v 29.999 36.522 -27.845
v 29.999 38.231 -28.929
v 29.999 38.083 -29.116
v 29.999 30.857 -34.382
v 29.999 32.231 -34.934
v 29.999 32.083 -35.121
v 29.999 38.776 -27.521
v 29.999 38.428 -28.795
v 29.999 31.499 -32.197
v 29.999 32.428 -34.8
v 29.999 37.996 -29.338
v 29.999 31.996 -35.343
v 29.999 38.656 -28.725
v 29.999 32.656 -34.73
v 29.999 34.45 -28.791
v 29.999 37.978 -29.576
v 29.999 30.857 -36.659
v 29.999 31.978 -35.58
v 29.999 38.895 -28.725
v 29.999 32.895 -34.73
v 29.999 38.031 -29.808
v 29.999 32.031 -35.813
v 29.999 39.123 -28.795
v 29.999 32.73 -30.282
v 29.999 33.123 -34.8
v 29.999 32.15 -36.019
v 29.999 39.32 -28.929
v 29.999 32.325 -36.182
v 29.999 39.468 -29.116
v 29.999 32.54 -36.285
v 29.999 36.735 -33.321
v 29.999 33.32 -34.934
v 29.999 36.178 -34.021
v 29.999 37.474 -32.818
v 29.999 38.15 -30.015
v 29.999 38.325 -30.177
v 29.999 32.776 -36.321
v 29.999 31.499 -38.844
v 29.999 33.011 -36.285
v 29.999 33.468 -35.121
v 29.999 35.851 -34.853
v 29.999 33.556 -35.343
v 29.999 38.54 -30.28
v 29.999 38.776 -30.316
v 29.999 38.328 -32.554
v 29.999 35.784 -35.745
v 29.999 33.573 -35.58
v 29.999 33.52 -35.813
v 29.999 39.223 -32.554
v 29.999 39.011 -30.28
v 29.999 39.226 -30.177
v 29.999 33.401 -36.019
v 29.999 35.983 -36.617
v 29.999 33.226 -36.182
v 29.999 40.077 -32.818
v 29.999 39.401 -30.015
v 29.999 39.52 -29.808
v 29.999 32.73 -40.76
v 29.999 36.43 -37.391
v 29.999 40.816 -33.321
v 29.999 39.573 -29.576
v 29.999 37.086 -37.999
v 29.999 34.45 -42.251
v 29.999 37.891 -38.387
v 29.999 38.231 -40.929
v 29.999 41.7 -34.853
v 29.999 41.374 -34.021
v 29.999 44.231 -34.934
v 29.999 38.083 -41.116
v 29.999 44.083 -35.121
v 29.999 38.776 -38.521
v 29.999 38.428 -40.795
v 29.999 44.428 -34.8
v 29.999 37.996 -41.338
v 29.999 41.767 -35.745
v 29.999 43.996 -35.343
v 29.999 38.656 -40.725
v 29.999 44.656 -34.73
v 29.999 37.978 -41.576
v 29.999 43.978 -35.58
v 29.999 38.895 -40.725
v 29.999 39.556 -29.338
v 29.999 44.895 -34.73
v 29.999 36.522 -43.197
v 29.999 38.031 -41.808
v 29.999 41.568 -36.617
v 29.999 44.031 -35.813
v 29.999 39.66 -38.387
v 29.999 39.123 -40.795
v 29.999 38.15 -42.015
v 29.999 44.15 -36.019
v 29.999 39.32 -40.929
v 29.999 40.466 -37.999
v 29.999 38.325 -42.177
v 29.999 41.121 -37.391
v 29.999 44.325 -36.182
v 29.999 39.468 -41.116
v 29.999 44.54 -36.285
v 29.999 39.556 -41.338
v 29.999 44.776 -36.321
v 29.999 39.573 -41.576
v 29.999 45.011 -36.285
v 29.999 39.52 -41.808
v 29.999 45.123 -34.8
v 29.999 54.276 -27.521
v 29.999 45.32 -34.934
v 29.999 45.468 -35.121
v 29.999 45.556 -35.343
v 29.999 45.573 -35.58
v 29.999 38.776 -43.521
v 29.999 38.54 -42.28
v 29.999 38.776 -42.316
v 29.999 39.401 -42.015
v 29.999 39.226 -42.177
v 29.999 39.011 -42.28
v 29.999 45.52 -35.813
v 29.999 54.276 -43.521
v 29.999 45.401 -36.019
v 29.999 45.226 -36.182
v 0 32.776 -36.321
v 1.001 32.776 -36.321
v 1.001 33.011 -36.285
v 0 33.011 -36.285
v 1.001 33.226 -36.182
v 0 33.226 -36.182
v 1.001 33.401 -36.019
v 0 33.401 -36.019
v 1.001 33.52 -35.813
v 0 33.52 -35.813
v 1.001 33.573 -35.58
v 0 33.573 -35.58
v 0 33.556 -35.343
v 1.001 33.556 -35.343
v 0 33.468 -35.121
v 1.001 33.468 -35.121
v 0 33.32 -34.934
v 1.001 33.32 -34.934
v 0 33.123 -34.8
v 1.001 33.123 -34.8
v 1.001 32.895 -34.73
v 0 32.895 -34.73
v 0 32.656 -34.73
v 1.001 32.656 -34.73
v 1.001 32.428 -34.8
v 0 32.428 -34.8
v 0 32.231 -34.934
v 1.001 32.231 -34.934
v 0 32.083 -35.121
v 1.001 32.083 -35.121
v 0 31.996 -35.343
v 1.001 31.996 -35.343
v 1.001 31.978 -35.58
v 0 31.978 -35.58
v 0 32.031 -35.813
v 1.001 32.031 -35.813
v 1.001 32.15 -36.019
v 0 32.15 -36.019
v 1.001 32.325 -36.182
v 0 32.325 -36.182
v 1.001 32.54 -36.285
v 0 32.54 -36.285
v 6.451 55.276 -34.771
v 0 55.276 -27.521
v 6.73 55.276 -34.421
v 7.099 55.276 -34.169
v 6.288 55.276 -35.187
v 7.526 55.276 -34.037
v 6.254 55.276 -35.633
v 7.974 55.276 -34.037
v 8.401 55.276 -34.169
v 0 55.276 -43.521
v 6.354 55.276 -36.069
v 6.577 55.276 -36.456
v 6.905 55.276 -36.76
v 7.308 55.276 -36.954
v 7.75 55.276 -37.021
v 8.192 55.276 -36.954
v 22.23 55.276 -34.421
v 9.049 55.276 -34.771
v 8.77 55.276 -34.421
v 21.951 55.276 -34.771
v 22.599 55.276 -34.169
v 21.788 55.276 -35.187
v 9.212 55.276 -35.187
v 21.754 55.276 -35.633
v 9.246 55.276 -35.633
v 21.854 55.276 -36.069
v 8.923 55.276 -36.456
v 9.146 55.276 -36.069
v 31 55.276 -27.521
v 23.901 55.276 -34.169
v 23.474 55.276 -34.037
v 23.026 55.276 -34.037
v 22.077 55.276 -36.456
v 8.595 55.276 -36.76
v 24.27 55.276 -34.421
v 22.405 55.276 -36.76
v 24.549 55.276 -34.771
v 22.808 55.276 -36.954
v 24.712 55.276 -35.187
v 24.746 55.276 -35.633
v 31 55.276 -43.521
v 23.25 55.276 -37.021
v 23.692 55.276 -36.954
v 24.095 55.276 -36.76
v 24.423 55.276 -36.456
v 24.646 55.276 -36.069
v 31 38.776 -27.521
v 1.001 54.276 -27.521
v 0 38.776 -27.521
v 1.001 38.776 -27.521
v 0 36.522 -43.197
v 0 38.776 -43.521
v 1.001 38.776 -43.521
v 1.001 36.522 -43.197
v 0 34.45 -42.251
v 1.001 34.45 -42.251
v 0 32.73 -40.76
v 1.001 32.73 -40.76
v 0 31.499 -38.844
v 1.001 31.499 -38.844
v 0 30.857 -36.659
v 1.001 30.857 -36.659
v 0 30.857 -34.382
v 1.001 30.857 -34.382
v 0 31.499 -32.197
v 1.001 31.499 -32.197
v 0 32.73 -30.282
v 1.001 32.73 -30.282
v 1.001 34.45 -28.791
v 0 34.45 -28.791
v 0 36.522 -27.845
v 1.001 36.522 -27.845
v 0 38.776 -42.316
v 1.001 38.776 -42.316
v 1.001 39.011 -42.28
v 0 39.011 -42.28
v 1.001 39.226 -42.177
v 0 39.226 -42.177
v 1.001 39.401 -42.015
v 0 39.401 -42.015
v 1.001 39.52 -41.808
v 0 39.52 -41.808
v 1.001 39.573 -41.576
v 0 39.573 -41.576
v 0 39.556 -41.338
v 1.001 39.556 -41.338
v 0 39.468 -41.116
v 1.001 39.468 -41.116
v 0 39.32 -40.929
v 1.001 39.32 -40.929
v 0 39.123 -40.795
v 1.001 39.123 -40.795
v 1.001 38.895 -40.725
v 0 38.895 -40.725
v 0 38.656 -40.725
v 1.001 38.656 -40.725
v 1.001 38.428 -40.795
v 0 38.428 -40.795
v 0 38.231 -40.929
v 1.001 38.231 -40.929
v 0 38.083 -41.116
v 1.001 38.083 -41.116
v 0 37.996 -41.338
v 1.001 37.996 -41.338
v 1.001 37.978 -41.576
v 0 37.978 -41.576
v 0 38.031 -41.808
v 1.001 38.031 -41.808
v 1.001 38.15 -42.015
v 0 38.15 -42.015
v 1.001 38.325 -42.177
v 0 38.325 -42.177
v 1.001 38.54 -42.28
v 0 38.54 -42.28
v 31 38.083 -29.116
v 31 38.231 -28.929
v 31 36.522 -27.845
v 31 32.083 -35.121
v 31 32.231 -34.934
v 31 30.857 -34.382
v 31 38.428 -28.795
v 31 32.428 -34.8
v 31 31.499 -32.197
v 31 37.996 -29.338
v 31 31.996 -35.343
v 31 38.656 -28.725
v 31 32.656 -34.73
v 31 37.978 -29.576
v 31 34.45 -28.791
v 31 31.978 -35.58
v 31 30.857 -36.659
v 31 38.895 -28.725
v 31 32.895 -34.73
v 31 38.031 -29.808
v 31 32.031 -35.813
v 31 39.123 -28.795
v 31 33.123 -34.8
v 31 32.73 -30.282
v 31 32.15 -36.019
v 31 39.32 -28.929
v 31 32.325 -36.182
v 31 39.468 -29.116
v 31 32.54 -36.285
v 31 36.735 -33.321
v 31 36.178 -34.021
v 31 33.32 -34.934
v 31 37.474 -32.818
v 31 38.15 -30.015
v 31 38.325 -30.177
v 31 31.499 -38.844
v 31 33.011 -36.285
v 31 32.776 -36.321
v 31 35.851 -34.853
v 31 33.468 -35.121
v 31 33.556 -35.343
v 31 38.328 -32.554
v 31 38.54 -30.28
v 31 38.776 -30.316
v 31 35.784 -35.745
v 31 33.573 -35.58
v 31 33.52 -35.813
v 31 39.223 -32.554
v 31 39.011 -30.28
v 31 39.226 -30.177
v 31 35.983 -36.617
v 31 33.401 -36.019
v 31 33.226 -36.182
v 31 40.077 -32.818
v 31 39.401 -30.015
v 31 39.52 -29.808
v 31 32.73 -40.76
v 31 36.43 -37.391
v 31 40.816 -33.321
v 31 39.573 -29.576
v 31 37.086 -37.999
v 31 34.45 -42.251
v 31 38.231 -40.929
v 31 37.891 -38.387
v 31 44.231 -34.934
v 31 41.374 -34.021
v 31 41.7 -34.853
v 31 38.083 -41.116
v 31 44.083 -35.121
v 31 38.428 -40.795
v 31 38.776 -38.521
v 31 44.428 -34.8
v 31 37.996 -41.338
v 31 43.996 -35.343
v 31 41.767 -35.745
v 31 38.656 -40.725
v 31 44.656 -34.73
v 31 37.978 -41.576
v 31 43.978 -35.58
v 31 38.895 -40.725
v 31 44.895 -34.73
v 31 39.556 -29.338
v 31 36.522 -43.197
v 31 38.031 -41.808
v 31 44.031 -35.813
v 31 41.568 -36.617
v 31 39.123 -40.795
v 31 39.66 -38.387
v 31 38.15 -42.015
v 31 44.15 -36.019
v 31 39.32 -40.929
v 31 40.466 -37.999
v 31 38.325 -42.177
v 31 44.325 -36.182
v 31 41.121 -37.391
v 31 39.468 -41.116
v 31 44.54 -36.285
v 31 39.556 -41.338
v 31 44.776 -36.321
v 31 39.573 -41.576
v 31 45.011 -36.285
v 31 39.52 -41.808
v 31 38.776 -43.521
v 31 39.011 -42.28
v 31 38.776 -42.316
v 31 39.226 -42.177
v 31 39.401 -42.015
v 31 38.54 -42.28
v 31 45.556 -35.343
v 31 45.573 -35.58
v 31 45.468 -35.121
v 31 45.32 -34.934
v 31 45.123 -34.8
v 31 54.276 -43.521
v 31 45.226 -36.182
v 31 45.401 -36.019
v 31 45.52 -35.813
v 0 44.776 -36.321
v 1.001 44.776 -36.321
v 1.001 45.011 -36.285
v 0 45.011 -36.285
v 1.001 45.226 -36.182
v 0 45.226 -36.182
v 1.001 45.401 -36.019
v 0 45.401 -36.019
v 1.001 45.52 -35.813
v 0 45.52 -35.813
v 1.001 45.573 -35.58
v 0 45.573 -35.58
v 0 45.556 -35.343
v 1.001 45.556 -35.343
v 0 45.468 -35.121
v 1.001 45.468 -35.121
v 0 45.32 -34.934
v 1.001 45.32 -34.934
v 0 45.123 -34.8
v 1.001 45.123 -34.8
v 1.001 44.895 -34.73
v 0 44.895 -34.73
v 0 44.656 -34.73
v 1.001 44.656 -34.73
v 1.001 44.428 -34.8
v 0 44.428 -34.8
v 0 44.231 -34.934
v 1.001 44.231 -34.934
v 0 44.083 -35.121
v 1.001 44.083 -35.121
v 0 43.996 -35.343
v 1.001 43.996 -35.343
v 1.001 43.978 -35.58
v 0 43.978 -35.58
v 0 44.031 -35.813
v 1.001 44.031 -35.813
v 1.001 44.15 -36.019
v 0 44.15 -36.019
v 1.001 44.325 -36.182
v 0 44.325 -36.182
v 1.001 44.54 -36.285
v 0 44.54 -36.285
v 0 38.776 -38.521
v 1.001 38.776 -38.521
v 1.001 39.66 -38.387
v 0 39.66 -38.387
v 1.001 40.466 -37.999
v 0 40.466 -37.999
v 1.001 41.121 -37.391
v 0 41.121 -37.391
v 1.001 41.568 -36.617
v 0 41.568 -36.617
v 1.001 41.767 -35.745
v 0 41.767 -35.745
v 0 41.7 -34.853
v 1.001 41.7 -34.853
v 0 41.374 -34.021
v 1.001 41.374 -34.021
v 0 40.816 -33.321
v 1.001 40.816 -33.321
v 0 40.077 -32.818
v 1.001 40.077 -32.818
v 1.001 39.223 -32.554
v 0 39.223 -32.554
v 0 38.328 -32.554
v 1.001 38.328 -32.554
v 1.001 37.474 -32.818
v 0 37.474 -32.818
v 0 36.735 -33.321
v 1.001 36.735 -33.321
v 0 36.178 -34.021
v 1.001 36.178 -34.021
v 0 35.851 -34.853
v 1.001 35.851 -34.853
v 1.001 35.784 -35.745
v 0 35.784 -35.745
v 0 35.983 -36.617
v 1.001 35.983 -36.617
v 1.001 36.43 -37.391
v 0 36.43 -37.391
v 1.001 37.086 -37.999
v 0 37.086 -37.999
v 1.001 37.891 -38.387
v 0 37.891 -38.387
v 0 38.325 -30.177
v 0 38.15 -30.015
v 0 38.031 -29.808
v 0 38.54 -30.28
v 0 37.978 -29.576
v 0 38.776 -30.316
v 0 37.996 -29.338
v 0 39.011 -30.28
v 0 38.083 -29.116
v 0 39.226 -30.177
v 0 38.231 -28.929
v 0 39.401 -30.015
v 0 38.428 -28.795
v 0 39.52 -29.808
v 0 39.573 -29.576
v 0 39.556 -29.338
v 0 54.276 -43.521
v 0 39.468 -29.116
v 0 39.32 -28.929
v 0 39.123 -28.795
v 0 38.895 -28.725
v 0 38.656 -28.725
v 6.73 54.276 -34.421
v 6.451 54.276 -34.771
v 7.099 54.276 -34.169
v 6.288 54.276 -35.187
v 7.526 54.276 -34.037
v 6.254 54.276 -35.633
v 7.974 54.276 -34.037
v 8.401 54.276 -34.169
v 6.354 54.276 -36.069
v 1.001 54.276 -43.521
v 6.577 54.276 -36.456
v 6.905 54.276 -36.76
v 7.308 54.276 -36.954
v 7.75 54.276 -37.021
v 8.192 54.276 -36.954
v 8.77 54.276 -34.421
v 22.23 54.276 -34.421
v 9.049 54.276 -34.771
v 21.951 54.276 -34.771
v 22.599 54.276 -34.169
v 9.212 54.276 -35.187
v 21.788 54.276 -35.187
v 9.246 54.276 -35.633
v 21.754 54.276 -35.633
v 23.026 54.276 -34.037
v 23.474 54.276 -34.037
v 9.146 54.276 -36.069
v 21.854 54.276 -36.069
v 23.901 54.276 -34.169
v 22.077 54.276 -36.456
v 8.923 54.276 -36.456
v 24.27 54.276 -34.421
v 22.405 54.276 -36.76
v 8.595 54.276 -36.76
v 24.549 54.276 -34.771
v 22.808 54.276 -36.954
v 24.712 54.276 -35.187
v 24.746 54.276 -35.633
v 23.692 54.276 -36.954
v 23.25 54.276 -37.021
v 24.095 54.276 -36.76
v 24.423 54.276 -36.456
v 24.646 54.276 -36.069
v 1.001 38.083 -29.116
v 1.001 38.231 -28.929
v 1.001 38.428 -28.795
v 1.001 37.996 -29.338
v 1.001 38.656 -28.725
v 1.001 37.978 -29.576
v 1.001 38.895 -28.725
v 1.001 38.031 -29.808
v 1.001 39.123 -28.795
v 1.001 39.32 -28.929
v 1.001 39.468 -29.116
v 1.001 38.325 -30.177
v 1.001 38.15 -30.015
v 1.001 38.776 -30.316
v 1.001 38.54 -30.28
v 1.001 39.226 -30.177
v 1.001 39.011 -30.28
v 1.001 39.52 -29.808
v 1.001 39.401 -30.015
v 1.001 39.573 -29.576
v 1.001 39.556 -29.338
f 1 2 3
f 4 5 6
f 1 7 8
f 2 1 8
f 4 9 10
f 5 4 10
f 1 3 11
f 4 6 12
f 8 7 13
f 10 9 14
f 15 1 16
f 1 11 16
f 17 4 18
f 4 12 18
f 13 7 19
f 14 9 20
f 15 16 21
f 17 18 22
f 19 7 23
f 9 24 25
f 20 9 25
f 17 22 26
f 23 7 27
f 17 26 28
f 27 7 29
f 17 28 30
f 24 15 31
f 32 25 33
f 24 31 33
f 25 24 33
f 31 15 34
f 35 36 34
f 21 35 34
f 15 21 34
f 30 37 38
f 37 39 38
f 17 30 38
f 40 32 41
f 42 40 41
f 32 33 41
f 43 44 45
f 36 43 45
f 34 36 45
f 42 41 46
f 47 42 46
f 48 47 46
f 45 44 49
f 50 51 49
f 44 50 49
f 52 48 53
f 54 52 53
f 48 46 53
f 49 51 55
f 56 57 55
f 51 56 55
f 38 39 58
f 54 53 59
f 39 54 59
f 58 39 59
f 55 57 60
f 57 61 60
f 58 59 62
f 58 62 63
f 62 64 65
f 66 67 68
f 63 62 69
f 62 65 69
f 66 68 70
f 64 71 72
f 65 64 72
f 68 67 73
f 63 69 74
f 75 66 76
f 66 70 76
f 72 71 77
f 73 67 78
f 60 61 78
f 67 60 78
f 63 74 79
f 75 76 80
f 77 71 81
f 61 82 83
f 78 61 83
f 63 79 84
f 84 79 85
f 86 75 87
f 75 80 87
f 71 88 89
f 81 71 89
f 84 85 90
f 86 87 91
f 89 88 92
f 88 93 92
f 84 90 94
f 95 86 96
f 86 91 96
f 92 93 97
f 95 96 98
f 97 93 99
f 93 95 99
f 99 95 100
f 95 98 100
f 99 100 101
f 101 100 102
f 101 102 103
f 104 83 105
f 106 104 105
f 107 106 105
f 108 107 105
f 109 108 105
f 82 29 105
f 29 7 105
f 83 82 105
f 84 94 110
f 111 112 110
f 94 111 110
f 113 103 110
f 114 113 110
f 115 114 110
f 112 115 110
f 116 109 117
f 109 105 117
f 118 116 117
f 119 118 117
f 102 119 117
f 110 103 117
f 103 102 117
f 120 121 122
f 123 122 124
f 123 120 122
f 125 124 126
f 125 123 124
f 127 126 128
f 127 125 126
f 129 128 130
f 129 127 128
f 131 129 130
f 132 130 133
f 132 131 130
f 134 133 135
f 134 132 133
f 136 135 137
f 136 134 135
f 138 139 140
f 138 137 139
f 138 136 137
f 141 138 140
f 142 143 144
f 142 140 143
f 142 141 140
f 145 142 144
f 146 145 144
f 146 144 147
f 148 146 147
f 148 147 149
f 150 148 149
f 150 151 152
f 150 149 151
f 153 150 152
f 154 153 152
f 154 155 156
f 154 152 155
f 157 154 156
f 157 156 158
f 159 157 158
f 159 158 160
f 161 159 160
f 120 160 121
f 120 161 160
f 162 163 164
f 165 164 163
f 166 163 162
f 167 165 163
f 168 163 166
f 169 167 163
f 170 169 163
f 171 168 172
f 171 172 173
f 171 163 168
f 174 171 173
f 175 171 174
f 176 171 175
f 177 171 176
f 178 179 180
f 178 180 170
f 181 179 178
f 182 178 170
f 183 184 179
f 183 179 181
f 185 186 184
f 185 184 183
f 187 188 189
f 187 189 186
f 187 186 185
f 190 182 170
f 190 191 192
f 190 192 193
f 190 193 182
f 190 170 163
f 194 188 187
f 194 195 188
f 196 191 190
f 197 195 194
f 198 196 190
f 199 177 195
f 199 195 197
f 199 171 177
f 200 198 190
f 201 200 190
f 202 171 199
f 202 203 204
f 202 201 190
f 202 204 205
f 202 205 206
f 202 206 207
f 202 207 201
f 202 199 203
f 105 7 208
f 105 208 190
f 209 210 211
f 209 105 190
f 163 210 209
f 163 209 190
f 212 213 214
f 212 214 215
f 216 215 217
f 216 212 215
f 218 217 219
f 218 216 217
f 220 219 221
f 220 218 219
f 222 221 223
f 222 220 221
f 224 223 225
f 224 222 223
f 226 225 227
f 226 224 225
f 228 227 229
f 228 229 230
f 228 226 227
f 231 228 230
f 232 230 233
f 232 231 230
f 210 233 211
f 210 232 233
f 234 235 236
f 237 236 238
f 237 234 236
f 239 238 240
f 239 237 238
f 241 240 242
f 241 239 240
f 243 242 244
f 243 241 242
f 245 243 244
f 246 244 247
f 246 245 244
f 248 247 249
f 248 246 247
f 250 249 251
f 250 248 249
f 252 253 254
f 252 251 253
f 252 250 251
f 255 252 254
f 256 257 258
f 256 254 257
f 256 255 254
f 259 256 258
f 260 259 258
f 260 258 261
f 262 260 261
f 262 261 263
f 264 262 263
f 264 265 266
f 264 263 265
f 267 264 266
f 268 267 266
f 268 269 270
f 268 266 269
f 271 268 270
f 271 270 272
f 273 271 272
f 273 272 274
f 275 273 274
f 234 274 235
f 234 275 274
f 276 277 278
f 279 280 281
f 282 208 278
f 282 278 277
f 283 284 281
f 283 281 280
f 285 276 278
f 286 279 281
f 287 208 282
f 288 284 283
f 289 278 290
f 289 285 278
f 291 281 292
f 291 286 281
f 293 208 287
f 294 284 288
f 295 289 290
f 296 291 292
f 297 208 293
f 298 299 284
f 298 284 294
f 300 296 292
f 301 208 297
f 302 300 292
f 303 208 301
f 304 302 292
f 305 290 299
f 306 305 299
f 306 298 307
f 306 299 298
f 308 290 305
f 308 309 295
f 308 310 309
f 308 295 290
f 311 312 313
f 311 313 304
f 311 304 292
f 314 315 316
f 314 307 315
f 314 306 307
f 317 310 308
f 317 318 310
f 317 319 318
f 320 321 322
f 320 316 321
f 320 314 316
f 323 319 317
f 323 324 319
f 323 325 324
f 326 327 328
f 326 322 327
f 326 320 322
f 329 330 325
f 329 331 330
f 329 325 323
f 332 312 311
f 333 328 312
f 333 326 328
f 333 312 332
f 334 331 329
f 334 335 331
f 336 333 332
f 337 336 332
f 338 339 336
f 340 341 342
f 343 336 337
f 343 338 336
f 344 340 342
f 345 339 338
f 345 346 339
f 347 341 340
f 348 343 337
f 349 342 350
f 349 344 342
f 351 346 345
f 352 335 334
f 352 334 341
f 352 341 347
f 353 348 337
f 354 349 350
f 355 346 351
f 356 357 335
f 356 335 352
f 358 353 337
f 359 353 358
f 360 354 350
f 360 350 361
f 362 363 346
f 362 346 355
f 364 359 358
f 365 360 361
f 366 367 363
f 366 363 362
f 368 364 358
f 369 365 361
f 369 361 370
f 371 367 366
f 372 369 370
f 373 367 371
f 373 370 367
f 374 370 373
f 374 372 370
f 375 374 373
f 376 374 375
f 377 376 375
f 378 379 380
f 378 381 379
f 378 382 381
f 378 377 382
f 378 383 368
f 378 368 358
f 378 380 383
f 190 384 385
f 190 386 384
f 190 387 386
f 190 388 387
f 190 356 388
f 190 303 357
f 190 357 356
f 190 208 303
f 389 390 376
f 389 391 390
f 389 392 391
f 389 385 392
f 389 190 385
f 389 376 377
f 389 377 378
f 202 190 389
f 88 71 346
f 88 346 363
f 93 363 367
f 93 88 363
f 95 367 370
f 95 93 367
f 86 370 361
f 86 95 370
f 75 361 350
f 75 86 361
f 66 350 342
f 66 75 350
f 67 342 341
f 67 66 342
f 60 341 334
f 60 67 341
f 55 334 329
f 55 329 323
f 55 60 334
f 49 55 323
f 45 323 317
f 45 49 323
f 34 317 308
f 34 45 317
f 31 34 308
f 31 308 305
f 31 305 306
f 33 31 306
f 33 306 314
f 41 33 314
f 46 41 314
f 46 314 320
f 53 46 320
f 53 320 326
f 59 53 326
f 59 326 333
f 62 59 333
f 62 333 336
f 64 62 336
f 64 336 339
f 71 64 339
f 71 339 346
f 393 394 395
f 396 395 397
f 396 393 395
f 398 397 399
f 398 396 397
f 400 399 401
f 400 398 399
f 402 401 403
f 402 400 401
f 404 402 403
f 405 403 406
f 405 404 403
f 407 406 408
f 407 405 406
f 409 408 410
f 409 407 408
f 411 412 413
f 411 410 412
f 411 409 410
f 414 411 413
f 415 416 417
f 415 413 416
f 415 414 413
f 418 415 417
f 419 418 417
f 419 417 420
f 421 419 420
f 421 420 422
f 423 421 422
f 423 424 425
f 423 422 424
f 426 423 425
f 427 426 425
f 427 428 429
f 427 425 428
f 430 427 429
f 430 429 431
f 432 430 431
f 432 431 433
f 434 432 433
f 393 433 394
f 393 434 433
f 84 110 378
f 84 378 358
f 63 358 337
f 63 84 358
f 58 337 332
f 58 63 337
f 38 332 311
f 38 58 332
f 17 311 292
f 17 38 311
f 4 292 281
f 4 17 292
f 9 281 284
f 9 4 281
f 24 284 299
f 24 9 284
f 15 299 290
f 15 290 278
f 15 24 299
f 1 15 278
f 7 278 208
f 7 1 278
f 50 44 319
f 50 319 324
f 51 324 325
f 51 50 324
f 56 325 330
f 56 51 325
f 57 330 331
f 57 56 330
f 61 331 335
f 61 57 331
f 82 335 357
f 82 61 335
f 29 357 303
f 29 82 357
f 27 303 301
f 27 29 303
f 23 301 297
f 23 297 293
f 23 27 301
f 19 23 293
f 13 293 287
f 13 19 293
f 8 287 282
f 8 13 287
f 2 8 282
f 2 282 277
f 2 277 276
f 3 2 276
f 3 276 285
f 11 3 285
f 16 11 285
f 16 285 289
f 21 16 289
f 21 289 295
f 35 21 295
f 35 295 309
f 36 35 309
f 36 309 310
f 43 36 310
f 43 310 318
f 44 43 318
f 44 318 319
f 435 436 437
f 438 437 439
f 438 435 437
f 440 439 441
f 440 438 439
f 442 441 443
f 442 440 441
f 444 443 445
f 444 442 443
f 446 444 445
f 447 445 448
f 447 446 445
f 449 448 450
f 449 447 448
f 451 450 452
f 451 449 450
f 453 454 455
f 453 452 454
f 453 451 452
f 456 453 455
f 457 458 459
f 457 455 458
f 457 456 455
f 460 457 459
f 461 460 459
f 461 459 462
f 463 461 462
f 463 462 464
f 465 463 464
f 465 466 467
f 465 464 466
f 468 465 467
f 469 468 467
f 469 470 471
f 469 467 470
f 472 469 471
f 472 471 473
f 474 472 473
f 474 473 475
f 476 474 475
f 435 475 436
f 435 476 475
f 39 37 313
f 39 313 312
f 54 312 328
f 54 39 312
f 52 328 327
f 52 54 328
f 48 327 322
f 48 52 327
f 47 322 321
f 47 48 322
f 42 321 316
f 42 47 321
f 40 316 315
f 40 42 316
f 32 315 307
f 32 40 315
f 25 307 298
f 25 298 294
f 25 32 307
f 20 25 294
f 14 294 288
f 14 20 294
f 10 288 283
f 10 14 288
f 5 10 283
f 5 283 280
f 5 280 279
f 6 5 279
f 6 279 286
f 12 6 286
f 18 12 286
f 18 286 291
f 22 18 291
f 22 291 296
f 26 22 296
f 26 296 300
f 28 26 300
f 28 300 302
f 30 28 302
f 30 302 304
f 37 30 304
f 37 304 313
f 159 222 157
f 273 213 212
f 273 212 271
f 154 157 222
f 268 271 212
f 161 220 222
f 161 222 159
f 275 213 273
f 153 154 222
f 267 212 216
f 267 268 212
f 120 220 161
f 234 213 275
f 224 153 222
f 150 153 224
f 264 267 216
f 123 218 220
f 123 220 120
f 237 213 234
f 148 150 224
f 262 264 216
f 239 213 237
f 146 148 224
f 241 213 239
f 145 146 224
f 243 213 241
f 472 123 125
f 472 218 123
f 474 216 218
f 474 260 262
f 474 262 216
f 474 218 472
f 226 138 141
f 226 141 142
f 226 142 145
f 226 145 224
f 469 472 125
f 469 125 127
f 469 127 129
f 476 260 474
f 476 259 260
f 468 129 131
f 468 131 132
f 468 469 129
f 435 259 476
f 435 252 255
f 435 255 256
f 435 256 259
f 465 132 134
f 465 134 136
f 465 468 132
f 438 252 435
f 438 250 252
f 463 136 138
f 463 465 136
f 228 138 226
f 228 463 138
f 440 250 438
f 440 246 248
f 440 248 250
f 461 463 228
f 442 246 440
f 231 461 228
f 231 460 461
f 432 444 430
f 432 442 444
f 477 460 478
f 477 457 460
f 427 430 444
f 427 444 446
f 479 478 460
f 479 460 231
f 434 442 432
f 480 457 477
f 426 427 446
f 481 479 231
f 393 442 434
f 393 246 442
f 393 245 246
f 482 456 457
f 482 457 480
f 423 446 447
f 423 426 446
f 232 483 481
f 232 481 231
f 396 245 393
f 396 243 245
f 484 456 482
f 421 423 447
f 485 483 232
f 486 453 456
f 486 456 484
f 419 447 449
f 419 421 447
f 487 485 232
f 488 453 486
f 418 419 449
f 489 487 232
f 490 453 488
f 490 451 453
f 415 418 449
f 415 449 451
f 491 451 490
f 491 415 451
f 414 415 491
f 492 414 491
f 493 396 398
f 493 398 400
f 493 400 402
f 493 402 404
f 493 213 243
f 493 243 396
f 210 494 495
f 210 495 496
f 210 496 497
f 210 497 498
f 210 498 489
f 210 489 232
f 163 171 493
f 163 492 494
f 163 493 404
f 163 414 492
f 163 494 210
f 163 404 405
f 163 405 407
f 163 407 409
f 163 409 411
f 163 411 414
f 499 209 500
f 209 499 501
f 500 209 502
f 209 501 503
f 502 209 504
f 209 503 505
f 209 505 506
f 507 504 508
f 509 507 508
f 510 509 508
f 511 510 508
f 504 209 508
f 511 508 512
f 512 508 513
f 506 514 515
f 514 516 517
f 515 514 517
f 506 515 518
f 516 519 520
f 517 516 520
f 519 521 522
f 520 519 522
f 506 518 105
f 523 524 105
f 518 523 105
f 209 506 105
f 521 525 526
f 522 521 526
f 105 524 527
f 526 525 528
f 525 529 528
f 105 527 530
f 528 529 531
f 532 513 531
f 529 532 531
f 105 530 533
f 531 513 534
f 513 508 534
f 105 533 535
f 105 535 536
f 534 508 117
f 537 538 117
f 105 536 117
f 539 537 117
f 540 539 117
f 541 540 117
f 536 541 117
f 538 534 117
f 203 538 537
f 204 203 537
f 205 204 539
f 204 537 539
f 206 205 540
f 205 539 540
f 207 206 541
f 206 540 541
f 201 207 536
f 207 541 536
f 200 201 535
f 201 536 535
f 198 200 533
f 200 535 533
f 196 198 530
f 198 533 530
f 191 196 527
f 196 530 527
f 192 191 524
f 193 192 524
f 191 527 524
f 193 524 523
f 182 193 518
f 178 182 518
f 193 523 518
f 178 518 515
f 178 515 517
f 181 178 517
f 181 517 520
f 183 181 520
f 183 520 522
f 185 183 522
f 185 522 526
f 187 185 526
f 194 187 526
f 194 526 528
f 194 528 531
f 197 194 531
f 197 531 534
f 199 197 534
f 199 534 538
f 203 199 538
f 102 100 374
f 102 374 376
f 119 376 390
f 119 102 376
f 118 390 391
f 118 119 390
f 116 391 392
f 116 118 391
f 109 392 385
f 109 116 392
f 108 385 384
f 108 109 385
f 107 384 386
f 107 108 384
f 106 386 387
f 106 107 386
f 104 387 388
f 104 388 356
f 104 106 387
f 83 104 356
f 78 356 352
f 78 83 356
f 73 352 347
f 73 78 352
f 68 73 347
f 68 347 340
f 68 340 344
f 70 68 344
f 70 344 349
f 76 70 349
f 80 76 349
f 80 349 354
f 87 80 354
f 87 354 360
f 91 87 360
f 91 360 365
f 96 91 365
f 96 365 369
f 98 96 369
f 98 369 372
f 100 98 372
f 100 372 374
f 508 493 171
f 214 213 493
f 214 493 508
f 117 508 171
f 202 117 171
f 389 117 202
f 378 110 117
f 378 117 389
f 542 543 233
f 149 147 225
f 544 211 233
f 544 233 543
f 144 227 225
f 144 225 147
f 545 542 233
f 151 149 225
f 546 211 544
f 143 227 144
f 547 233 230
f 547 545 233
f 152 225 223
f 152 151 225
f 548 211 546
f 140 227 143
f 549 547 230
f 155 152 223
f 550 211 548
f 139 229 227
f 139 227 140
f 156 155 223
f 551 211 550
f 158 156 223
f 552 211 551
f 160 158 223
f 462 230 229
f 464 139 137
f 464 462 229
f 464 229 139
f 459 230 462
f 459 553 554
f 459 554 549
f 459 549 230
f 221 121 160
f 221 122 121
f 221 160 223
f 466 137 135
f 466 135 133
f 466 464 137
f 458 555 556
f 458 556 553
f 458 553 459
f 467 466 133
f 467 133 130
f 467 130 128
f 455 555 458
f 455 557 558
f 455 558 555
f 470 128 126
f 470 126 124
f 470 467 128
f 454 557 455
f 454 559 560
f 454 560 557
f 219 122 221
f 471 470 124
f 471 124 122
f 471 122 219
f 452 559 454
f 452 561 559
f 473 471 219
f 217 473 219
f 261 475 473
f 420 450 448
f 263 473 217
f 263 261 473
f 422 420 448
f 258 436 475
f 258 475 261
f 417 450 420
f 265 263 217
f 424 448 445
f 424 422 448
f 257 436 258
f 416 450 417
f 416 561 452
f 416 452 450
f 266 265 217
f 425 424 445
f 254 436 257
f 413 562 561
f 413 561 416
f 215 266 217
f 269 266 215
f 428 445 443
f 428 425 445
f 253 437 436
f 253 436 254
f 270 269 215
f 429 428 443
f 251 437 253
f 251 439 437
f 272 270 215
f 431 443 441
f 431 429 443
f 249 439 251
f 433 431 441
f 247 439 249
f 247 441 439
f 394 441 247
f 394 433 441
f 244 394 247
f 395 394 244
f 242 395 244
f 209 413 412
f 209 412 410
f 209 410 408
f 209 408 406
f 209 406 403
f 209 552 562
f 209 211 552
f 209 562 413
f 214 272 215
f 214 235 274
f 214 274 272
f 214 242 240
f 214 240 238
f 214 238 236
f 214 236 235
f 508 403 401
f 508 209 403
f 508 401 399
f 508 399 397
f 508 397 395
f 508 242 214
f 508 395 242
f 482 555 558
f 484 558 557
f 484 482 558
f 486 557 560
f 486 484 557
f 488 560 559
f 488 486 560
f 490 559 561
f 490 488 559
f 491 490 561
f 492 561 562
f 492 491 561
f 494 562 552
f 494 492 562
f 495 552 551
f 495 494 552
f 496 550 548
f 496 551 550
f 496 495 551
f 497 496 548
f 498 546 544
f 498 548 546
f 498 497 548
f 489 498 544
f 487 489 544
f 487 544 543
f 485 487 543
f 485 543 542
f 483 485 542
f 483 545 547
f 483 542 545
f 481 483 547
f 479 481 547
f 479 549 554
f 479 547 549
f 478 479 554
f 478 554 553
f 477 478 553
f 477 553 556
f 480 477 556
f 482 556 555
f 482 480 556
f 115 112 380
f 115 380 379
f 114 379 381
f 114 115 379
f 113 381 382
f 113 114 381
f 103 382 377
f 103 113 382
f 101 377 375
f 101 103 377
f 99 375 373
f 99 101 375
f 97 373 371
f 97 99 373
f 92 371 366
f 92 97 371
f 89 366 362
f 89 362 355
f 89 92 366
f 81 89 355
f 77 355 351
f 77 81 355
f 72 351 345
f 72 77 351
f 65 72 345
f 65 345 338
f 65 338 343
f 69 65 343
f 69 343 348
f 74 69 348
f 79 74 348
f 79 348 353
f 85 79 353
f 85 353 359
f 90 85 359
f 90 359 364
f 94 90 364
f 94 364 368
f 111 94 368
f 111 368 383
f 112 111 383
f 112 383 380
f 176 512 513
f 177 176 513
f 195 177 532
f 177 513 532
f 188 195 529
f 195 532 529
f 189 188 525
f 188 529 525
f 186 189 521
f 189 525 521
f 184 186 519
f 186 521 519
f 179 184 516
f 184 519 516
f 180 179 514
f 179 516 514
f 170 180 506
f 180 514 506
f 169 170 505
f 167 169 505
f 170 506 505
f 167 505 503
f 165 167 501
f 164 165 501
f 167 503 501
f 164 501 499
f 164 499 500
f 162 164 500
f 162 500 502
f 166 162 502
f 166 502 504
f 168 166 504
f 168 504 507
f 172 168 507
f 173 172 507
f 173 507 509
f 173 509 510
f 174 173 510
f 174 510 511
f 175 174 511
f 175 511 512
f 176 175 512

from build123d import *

# Parameters (mm, degrees)
SKETCH1_R           = 0.8
SKETCH1_R_2         = 3
BOSS_EXTRUDE1_DEPTH = 31
BOSS_EXTRUDE2_DEPTH = 1
SKETCH5_R           = 0.8
CUT_EXTRUDE3_DEPTH  = 1
SKETCH5_3_R         = 3
CUT_EXTRUDE4_DEPTH  = 1
CUT_EXTRUDE6_START  = -1
SKETCH6_W           = 28.997664588
SKETCH6_H           = 18.792631537
CUT_EXTRUDE6_DEPTH  = 104.494601352
SKETCH7_W           = 31
SKETCH7_H           = 56.017020421
CUT_EXTRUDE7_DEPTH  = 105.264671446
SKETCH8_R           = 1.5
CUT_EXTRUDE8_DEPTH  = 59.37205382


with BuildPart() as part:
    # Sketch1 → Boss-Extrude1 (new body)
    with BuildSketch(Plane(origin=(0, 0, 0), x_dir=(0, 0, -1), z_dir=(1, 0, 0))):
        with BuildLine():
            Line((27.520646447, 38.775594), (27.520646447, 55.275594))
            Line((27.520646447, 55.275594), (43.520646447, 55.275594))
            Line((43.520646447, 55.275594), (43.520646447, 38.775594))
            ThreePointArc((43.520646447, 38.775594), (35.520646447, 30.775594), (27.520646447, 38.775594))
        make_face()
        with Locations((35.520646447, 44.775594)):
            Circle(SKETCH1_R, mode=Mode.SUBTRACT)
        with Locations((41.515881392, 38.775594)):
            Circle(SKETCH1_R, mode=Mode.SUBTRACT)
        with Locations((35.520646447, 32.775594)):
            Circle(SKETCH1_R, mode=Mode.SUBTRACT)
        with Locations((29.515881392, 38.775594)):
            Circle(SKETCH1_R, mode=Mode.SUBTRACT)
        with Locations((35.520646447, 38.775594)):
            Circle(SKETCH1_R_2, mode=Mode.SUBTRACT)
    extrude(amount=BOSS_EXTRUDE1_DEPTH)

    # Sketch4 → Boss-Extrude2 (add)
    with BuildSketch(Plane(origin=(0, 55.275594, 0), x_dir=(1, 0, 0), z_dir=(0, 1, 0))):
        with BuildLine():
            Line((0, 43.520646447), (31, 43.520646447))
            Line((31, 43.520646447), (31, 65.088337856))
            Line((31, 65.088337856), (31, 81.236093118))
            ThreePointArc((31, 81.236093118), (15.5, 96.736093118), (0, 81.236093118))
            Line((0, 81.236093118), (0, 65.088337856))
            Line((0, 65.088337856), (0, 43.520646447))
        make_face()
    extrude(amount=-BOSS_EXTRUDE2_DEPTH)

    # Sketch5 → Cut-Extrude3 (cut)
    with BuildSketch(Plane.XZ.offset(-54.275594)):
        with Locations((9.5, -81.236093118)):
            Circle(SKETCH5_R)
        with Locations((15.5, -75.236093118)):
            Circle(SKETCH5_R)
        with Locations((21.5, -81.236093118)):
            Circle(SKETCH5_R)
        with Locations((15.5, -87.236093118)):
            Circle(SKETCH5_R)
    extrude(amount=-CUT_EXTRUDE3_DEPTH, mode=Mode.SUBTRACT)

    # Sketch5<3> → Cut-Extrude4 (cut)
    with BuildSketch(Plane.XZ.offset(-54.275594)):
        with Locations((15.5, -81.236093118)):
            Circle(SKETCH5_3_R)
    extrude(amount=-CUT_EXTRUDE4_DEPTH, mode=Mode.SUBTRACT)

    # Sketch6 → Cut-Extrude6 (cut, through all)
    with BuildSketch(Plane(origin=(0, 55.275594, 0), x_dir=(1, 0, 0), z_dir=(0, 1, 0)).offset(CUT_EXTRUDE6_START)):
        with Locations((15.5, 35.520646447)):
            Rectangle(SKETCH6_W, SKETCH6_H)
    extrude(amount=-CUT_EXTRUDE6_DEPTH, mode=Mode.SUBTRACT)

    # Sketch7 → Cut-Extrude7 (cut, through all)
    with BuildSketch(Plane.XZ.offset(-54.275594)):
        with Locations((15.5, -71.529156658)):
            Rectangle(SKETCH7_W, SKETCH7_H)
    extrude(amount=-CUT_EXTRUDE7_DEPTH, mode=Mode.SUBTRACT)

    # Sketch8 → Cut-Extrude8 (cut, through all)
    with BuildSketch(Plane.XZ.offset(-54.275594)):
        with Locations((7.75, -35.520646447)):
            Circle(SKETCH8_R)
        with Locations((23.25, -35.520646447)):
            Circle(SKETCH8_R)
    extrude(amount=-CUT_EXTRUDE8_DEPTH, mode=Mode.SUBTRACT)


solid = part.part
